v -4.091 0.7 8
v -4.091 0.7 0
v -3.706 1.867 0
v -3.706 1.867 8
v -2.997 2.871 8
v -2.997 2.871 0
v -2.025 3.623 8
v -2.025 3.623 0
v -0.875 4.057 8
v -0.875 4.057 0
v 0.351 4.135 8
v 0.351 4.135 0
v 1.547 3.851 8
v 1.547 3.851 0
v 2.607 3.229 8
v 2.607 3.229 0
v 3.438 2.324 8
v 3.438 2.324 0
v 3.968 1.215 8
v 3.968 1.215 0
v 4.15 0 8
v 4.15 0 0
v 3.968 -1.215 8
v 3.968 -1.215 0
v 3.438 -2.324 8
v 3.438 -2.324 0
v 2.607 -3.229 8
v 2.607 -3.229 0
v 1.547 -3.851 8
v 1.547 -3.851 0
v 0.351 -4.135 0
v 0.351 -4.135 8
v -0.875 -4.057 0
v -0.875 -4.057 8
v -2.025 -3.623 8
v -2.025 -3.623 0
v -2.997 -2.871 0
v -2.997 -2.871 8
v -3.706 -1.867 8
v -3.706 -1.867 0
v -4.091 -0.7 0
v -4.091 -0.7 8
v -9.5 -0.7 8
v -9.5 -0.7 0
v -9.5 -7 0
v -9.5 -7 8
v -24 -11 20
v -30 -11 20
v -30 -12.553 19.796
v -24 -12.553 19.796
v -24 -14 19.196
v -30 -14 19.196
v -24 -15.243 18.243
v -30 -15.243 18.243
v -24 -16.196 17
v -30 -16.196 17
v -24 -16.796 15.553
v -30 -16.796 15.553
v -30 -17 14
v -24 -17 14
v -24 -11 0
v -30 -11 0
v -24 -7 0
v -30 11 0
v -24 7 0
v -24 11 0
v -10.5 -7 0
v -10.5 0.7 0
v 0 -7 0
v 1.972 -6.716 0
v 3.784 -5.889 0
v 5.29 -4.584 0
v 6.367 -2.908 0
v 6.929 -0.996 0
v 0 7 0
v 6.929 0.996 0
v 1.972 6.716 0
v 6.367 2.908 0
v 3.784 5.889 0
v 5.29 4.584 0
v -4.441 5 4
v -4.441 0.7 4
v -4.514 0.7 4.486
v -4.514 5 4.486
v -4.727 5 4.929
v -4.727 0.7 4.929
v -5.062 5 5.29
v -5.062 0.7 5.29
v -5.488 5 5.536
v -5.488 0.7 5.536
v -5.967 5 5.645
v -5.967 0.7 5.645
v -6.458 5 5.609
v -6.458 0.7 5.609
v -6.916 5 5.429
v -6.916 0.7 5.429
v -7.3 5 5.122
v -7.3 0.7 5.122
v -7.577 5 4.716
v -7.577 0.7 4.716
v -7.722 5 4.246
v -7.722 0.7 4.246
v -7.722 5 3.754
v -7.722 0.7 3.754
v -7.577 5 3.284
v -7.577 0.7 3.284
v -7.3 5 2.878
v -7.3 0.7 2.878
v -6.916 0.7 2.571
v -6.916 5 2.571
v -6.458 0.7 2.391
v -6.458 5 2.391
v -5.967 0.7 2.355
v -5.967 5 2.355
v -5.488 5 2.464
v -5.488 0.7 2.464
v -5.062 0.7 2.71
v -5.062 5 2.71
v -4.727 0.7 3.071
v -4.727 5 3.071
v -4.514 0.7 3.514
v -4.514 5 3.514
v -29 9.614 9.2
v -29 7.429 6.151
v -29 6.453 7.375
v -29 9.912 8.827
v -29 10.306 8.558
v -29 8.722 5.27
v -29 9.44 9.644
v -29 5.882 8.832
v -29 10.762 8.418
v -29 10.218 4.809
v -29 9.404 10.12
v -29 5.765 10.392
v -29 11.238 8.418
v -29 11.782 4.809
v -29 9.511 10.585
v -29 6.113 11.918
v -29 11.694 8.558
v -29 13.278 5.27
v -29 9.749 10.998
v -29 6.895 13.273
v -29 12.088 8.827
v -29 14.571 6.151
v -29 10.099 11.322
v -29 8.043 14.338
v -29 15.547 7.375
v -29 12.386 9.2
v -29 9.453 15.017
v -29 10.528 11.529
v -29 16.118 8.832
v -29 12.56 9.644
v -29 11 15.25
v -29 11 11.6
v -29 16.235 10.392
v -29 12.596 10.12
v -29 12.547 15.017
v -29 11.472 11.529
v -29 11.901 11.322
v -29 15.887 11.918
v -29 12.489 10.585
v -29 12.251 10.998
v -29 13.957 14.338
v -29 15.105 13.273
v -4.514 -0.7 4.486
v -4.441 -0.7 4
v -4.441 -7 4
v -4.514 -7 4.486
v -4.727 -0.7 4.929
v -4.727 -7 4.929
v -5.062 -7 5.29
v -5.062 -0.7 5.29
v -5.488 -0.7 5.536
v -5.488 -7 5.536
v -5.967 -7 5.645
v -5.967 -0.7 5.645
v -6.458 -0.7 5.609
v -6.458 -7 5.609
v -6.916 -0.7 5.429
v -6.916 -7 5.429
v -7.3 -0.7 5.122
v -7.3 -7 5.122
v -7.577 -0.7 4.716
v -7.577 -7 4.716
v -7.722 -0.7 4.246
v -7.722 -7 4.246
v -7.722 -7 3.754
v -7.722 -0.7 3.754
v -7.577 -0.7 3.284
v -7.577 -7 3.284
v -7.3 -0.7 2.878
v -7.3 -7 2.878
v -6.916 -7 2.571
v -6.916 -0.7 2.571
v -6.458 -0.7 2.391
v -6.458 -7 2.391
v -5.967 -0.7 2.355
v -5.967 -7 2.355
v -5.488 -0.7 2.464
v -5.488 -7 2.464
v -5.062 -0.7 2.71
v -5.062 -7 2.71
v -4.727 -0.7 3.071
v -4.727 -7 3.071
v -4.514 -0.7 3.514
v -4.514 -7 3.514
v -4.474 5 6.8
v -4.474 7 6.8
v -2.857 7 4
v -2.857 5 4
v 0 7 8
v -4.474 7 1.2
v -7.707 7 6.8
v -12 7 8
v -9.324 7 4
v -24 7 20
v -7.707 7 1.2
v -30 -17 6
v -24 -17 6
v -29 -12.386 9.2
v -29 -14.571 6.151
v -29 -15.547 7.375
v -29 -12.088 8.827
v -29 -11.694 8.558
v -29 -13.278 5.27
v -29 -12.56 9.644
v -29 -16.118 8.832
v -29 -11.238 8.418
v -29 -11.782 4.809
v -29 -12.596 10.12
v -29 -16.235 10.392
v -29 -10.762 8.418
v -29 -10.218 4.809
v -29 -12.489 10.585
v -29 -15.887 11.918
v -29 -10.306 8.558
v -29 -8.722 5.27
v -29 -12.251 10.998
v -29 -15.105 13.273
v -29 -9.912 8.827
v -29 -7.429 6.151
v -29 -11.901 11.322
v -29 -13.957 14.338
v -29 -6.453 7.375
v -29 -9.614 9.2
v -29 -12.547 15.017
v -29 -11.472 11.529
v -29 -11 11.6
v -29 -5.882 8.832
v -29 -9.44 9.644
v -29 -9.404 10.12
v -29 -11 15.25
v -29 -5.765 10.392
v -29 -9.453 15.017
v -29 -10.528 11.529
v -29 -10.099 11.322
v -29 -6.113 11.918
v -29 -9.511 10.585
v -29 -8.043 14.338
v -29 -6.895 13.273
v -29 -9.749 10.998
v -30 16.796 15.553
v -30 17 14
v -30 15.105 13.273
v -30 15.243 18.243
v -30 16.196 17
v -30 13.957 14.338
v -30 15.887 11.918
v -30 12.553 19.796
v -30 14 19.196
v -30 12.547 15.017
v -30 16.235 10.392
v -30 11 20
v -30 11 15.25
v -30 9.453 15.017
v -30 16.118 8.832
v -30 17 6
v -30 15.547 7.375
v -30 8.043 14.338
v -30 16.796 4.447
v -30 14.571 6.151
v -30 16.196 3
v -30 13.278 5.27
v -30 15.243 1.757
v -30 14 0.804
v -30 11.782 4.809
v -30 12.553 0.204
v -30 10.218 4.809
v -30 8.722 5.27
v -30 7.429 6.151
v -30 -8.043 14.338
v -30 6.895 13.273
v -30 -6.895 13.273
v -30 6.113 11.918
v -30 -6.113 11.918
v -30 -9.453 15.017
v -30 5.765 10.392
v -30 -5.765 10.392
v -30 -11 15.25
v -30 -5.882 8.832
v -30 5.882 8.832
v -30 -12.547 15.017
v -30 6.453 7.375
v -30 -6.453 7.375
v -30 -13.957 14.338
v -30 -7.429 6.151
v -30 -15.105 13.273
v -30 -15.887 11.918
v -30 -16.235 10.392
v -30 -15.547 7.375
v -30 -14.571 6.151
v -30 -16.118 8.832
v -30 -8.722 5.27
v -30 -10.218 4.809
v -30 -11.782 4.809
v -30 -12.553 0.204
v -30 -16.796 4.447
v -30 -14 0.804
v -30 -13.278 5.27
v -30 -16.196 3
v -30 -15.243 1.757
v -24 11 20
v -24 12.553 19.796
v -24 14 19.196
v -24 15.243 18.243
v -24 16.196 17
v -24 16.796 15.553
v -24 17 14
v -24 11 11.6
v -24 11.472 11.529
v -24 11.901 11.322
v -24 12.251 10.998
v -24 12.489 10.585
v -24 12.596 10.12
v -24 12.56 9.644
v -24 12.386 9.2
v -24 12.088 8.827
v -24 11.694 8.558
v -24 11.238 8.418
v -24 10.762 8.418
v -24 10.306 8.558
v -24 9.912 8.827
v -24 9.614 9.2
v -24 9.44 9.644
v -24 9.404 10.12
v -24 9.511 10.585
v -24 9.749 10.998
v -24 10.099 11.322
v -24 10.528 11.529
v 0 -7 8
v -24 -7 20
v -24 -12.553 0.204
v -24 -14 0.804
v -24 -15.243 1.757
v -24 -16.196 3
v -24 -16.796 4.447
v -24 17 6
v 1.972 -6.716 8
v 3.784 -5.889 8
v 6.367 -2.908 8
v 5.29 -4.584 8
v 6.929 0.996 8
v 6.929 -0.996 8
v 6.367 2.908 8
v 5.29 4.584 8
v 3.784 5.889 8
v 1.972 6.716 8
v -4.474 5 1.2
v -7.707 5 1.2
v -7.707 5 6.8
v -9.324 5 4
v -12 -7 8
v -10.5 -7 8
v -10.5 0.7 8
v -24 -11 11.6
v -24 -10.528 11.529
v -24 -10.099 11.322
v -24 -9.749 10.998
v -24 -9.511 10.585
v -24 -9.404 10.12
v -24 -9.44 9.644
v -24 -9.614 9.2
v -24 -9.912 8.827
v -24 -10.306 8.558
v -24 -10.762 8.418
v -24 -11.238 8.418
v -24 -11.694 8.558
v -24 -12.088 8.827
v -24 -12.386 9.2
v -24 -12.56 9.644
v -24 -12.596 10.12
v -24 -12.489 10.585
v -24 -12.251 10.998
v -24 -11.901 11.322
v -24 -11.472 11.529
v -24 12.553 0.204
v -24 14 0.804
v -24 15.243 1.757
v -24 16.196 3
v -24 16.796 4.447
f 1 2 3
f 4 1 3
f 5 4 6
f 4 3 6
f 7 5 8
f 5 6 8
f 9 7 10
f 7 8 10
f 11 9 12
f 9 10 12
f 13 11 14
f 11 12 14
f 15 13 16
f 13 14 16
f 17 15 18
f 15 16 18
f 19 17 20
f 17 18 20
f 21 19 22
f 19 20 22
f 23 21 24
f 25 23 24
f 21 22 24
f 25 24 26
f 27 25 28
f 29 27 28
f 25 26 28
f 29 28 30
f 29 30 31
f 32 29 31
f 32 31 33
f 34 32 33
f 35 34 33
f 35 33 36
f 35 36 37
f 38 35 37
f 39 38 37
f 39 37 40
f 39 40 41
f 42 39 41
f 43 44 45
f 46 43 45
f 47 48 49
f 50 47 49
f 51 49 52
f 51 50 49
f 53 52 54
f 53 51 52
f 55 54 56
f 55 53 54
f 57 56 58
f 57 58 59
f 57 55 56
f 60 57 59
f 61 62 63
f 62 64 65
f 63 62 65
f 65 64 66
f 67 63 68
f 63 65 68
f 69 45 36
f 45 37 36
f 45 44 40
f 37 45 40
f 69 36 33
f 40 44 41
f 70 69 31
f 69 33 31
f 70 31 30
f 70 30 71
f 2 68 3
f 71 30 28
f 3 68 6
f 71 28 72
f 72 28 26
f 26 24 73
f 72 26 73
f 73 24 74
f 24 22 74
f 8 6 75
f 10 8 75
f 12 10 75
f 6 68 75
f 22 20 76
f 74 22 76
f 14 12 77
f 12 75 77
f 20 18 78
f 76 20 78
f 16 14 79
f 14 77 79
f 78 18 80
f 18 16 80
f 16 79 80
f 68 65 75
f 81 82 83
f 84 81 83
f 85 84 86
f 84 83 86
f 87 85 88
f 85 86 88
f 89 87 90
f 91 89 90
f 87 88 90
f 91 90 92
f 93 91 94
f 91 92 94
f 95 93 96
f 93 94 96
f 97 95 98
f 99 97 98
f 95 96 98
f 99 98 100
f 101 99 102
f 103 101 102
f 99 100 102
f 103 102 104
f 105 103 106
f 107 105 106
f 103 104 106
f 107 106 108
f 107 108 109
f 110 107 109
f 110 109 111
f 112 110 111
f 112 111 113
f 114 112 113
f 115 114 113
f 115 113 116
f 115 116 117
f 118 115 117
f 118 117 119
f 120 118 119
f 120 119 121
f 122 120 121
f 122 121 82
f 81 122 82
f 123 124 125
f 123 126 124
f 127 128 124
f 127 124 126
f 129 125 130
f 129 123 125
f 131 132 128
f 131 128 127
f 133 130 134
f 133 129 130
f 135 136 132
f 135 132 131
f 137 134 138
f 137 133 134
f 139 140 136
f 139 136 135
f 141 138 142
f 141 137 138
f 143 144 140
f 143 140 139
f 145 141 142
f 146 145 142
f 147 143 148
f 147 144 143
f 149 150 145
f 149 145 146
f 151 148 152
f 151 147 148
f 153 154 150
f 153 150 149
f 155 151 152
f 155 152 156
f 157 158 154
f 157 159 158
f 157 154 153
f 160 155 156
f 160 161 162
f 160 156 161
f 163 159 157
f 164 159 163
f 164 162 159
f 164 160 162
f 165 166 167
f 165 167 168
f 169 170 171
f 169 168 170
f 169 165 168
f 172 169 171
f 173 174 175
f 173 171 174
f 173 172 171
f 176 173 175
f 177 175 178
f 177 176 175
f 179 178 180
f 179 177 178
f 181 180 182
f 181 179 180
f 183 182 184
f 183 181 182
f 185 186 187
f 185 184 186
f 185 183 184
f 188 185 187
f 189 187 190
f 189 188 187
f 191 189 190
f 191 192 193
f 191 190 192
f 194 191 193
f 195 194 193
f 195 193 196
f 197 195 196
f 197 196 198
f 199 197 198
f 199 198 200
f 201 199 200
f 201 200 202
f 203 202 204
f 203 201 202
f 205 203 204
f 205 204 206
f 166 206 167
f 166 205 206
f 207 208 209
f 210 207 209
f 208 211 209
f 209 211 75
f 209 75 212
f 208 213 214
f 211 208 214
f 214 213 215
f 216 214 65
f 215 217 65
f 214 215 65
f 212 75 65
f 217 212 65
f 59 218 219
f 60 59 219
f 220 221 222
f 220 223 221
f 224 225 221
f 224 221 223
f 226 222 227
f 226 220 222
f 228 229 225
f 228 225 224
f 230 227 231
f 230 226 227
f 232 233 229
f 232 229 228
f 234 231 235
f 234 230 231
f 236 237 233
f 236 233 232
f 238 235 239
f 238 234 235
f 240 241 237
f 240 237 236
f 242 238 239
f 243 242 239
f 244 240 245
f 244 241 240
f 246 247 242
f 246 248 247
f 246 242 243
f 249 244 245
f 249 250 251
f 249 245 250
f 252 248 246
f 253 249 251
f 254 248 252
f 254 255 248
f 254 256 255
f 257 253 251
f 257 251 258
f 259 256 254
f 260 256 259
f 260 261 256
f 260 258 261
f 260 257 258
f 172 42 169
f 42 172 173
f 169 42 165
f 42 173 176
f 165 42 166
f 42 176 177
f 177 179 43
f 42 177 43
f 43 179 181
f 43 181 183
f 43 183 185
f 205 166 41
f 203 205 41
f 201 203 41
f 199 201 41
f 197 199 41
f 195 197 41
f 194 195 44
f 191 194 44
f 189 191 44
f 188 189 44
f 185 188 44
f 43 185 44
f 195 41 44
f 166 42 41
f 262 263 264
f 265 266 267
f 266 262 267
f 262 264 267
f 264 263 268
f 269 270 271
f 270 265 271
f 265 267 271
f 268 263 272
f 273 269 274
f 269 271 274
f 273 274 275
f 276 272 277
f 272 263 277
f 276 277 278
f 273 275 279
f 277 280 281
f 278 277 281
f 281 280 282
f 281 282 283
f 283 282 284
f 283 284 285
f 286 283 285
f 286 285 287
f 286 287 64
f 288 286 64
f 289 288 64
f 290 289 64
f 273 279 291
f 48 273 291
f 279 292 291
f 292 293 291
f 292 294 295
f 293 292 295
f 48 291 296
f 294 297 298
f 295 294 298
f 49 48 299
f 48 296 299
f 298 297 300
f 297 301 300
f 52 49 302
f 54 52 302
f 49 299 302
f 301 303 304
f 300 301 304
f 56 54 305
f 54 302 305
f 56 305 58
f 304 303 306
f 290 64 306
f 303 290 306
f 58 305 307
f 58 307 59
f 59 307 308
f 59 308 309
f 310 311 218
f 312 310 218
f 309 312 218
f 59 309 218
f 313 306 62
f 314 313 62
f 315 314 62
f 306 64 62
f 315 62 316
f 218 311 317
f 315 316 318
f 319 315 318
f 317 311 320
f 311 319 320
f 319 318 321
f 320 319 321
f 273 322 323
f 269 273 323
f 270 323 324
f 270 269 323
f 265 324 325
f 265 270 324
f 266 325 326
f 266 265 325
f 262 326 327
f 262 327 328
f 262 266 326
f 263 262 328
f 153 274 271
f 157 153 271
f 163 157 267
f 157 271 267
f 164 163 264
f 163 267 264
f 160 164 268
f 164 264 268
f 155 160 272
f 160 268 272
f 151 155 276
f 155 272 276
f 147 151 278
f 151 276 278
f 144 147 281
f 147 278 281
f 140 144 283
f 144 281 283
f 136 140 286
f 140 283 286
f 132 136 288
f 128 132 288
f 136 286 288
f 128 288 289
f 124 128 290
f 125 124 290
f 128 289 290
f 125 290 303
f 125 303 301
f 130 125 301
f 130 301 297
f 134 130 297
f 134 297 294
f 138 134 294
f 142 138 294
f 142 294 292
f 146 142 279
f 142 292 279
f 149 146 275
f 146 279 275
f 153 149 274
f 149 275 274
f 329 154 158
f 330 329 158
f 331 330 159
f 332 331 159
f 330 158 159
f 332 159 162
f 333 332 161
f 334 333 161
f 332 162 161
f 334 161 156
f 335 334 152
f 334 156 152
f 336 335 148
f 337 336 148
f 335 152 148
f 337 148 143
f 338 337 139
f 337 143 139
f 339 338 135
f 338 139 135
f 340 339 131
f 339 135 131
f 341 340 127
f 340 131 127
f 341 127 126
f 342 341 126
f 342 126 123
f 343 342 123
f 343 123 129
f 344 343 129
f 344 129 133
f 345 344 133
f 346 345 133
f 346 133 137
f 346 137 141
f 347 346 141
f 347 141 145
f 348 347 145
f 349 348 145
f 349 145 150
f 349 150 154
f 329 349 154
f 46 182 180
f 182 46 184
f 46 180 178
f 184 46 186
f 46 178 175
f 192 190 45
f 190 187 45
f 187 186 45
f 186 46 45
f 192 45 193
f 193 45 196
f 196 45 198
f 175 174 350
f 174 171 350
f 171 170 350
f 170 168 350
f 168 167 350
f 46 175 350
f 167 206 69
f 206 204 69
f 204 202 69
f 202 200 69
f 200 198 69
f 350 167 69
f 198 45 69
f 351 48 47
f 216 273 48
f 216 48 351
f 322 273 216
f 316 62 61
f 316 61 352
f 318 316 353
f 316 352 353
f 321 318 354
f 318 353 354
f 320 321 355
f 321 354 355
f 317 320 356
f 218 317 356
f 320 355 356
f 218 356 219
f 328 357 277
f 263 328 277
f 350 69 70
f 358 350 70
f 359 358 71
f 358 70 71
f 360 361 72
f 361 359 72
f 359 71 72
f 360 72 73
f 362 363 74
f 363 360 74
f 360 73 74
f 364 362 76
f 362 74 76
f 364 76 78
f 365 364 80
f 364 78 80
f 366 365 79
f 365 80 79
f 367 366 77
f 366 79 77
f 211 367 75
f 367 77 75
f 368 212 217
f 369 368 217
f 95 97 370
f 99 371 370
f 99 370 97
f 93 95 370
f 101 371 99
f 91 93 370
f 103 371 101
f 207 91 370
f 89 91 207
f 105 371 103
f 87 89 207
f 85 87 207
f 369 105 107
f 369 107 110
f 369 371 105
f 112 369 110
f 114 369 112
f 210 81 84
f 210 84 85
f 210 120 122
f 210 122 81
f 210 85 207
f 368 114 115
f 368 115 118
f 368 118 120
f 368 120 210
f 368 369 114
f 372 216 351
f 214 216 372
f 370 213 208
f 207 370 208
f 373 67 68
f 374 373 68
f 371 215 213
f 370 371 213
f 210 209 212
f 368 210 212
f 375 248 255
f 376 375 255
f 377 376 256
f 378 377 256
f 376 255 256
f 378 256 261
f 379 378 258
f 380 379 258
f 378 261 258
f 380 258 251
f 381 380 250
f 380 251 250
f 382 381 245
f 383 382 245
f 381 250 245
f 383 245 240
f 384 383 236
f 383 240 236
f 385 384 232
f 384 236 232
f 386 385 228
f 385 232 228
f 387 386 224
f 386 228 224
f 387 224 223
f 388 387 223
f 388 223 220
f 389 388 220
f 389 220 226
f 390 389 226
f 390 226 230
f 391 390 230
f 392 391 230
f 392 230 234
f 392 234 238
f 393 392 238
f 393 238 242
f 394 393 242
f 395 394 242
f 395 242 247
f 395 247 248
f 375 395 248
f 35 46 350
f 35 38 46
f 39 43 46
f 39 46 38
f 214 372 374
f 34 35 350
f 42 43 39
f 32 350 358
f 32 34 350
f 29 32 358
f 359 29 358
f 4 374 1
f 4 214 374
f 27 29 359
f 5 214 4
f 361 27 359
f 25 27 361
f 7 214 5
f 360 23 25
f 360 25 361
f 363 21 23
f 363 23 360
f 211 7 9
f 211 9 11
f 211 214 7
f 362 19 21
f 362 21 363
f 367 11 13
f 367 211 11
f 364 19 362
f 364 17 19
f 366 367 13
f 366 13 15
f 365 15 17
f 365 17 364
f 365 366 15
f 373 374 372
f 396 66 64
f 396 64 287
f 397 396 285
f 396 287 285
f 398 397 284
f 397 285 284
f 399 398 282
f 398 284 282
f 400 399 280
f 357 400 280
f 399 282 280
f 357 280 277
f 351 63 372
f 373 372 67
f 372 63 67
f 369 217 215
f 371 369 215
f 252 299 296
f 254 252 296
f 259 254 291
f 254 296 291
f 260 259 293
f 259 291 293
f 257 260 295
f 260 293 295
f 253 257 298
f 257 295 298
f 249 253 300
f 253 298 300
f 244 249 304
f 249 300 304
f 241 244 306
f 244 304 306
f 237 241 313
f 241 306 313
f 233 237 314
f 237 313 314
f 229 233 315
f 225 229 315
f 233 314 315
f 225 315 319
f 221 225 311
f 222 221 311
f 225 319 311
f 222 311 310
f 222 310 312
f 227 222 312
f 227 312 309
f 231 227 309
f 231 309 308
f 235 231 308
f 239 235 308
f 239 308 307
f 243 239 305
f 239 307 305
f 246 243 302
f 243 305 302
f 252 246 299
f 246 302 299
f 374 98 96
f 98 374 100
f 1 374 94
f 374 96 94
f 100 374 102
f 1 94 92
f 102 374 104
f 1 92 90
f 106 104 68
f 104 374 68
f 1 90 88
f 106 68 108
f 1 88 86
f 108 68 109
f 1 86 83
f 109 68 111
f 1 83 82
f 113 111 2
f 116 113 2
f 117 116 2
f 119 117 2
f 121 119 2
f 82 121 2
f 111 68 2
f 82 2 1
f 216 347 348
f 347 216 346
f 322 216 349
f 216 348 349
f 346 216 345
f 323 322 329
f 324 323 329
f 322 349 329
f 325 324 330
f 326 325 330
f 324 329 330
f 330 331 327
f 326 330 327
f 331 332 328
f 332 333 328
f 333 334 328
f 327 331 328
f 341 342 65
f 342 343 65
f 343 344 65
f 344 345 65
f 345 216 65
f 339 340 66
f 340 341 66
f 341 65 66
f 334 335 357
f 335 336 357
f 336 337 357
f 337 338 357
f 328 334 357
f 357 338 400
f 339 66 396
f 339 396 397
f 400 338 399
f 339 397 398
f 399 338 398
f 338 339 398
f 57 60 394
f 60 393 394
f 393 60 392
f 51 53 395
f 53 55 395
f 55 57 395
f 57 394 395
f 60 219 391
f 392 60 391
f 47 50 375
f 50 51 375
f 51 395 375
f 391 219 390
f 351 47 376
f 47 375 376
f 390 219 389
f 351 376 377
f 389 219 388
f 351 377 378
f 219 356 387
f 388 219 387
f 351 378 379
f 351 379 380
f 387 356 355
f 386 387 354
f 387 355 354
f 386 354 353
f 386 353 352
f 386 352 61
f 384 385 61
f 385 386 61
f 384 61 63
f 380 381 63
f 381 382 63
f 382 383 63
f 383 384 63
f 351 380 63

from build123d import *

# Parameters (mm, degrees)
RESSALTO_EXTRUS_O1_DEPTH   = 20
ESBO_O4_R                  = 1.6
CORTE_EXTRUS_O2_DEPTH      = 18
ESBO_O5_R                  = 5.25
CORTE_EXTRUS_O3_DEPTH      = 1
FILETE1_R                  = 6
CORTE_EXTRUS_O6_DEPTH      = 25
ESBO_O6_R                  = 1.65
CORTE_EXTRUS_O4_DEPTH      = 18.7
CORTE_EXTRUS_O4_DEPTH_BACK = 17.3
CORTE_EXTRUS_O5_DEPTH      = 2


with BuildPart() as part:
    # Esboço2 → Ressalto-extrusão1 (new body)
    with BuildSketch(Plane.XY):
        with BuildLine():
            Line((0, 7), (-24, 7))
            Line((-24, 7), (-24, 17))
            Line((-24, 17), (-30, 17))
            Line((-30, 17), (-30, -17))
            Line((-30, -17), (-24, -17))
            Line((-24, -17), (-24, -7))
            Line((-24, -7), (-10.5, -7))
            Line((-10.5, -7), (-10.5, 0.7))
            Line((-10.5, 0.7), (-4.090537862, 0.7))
            ThreePointArc((-4.090537862, 0.7), (4.15, 0), (-4.090537862, -0.7))
            Line((-4.090537862, -0.7), (-9.5, -0.7))
            Line((-9.5, -0.7), (-9.5, -7))
            Line((-9.5, -7), (0, -7))
            ThreePointArc((0, -7), (7, 0), (0, 7))
        make_face()
    extrude(amount=RESSALTO_EXTRUS_O1_DEPTH)

    # Esboço4 → Corte-extrusão2 (cut)
    with BuildSketch(Plane.ZY.offset(30)):
        with Locations((10, 11)):
            Circle(ESBO_O4_R)
        with Locations((10, -11)):
            Circle(ESBO_O4_R)
    extrude(amount=-CORTE_EXTRUS_O2_DEPTH, mode=Mode.SUBTRACT)

    # Esboço5 → Corte-extrusão3 (cut)
    with BuildSketch(Plane.ZY.offset(30)):
        with Locations((10, 11)):
            Circle(ESBO_O5_R)
        with Locations((10, -11)):
            Circle(ESBO_O5_R)
    extrude(amount=-CORTE_EXTRUS_O3_DEPTH, mode=Mode.SUBTRACT)

    # Filete1
    filete1_edges = [part.edges().sort_by_distance(p)[0] for p in [
        (-27, -17, 20),
        (-27, -17, 0),
        (-27, 17, 0),
        (-27, 17, 20),
    ]]
    fillet(filete1_edges, radius=FILETE1_R)

    # Esboço8 → Corte-extrusão6 (cut, through all)
    with BuildSketch(Plane(origin=(0, 7, 0), x_dir=(1, 0, 0), z_dir=(0, 1, 0))):
        Polygon((-24, -20), (-12, -8), (7, -8), (7, -20), align=None)
    extrude(amount=-CORTE_EXTRUS_O6_DEPTH, mode=Mode.SUBTRACT)

    # Esboço6 → Corte-extrusão4 (cut, two sides)
    with BuildSketch(Plane.XZ.offset(-0.7)) as corte_extrus_o4_sk:
        with Locations((-6.090537862, 4)):
            Circle(ESBO_O6_R)
    extrude(amount=CORTE_EXTRUS_O4_DEPTH, mode=Mode.SUBTRACT)
    extrude(corte_extrus_o4_sk.sketch, amount=-CORTE_EXTRUS_O4_DEPTH_BACK, mode=Mode.SUBTRACT)

    # Esboço7 → Corte-extrusão5 (cut)
    with BuildSketch(Plane(origin=(0, 7, 0), x_dir=(1, 0, 0), z_dir=(0, 1, 0))):
        Polygon((-2.857376354, -4), (-4.473957108, -1.2), (-7.707118616, -1.2), (-9.323699369, -4), (-7.707118616, -6.8), (-4.473957108, -6.8), align=None)
    extrude(amount=-CORTE_EXTRUS_O5_DEPTH, mode=Mode.SUBTRACT)


solid = part.part
